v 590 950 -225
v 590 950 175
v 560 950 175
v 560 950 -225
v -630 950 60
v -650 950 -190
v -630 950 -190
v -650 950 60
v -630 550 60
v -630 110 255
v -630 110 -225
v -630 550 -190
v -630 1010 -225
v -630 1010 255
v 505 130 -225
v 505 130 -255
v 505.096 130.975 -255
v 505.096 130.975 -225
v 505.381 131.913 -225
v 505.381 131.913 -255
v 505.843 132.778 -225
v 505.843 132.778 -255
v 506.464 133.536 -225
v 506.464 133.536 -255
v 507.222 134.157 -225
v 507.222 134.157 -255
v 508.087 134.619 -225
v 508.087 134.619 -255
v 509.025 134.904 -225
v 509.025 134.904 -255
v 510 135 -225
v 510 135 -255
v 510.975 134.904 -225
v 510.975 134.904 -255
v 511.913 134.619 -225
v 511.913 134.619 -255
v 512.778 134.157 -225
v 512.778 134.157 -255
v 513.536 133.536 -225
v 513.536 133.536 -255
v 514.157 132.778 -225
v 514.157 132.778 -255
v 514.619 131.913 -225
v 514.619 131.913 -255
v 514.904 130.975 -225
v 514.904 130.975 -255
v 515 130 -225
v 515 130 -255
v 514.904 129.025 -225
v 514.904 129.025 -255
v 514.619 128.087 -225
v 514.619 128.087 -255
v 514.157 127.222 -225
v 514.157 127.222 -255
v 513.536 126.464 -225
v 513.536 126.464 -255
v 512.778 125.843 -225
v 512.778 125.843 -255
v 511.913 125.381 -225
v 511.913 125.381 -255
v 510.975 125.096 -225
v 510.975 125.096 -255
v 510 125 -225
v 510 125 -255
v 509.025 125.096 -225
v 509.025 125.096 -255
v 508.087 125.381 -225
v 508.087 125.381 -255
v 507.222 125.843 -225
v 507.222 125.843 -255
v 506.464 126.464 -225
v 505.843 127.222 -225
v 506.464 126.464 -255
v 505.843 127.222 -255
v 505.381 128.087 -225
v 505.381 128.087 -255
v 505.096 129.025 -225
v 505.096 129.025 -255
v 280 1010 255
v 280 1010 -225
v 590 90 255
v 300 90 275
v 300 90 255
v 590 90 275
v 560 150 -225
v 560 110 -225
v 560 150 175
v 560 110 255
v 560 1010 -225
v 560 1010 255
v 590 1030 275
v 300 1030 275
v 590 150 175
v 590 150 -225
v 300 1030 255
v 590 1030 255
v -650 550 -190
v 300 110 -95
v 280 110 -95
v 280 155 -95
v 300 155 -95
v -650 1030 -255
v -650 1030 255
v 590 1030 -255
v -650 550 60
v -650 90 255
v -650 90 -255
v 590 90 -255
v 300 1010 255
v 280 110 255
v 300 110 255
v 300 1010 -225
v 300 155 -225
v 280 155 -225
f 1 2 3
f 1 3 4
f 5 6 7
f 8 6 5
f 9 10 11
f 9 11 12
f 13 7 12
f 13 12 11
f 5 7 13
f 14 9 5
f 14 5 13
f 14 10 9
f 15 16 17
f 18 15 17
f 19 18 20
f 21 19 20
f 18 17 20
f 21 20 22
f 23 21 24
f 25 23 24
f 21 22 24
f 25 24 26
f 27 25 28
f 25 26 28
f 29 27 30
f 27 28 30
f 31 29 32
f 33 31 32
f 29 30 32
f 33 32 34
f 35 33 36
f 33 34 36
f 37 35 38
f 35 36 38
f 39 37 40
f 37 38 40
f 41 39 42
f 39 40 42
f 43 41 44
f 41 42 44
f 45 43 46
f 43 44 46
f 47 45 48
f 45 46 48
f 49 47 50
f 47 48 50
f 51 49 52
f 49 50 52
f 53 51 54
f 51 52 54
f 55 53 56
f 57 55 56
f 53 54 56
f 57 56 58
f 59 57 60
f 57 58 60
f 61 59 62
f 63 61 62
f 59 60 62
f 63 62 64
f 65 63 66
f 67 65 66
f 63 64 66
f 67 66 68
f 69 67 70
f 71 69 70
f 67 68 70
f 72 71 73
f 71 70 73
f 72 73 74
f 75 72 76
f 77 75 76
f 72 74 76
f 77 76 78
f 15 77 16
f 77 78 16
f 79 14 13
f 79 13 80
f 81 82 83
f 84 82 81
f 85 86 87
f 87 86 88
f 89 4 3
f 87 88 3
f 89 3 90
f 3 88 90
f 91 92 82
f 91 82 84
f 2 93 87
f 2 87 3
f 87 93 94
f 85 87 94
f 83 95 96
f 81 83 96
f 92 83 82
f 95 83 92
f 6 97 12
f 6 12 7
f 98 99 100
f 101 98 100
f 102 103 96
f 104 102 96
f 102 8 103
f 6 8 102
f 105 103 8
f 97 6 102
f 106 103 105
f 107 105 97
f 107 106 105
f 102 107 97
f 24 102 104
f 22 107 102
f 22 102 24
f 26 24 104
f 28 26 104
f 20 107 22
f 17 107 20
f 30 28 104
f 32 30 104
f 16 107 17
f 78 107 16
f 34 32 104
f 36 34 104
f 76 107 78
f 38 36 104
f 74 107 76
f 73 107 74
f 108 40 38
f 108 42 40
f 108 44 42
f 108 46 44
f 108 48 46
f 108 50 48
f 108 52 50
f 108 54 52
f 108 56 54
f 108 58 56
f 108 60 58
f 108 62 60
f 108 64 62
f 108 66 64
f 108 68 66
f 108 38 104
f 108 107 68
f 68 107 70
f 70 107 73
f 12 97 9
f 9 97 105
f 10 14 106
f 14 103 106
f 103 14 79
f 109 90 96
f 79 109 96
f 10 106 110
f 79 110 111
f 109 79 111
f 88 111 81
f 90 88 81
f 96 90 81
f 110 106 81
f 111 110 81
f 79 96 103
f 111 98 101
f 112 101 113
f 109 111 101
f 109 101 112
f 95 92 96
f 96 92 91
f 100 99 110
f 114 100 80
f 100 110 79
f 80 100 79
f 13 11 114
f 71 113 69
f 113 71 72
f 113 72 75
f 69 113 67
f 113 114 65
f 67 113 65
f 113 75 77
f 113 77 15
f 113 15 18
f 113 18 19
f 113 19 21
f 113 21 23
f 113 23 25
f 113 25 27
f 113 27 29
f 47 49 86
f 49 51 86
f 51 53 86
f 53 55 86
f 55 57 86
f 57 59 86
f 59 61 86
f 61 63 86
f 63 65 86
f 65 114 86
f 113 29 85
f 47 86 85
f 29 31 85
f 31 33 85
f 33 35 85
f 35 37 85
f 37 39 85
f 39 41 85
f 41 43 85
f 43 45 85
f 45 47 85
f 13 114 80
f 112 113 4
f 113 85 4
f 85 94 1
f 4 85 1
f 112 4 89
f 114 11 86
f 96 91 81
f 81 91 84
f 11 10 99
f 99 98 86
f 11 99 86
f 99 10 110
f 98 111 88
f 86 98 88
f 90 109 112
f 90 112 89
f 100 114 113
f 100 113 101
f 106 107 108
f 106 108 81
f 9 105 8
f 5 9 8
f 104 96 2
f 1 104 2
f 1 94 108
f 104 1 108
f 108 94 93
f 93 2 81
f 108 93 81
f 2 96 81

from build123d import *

# Parameters (mm, degrees)
CROQUIS1_W              = 1300
CROQUIS1_H              = 510
SALIENTE_EXTRUIR1_DEPTH = 1200
CROQUIS2_W              = 910
CROQUIS2_H              = 900
CORTAR_EXTRUIR1_DEPTH   = 480
CROQUIS3_W              = 250
CROQUIS3_H              = 400
CORTAR_EXTRUIR2_DEPTH   = 70
CROQUIS4_W              = 260
CROQUIS4_H              = 900
CORTAR_EXTRUIR3_DEPTH   = 480
CROQUIS5_W              = 400
CROQUIS5_H              = 800
CORTAR_EXTRUIR4_DEPTH   = 320
CROQUIS6_W              = 130
CROQUIS6_H              = 45
CORTAR_EXTRUIR5_DEPTH   = 230
CROQUIS7_W              = 350
CROQUIS7_H              = 1200
SALIENTE_EXTRUIR2_DEPTH = 20
CROQUIS9_W              = 510
CROQUIS9_H              = 90
CORTAR_EXTRUIR6_DEPTH   = 1440
CORTAR_EXTRUIR7_DEPTH   = 1440
CROQUIS12_W             = 290
CROQUIS12_H             = 90
CORTAR_EXTRUIR8_DEPTH   = 1440
CROQUIS14_W             = 1303.36123447
CROQUIS14_H             = 170
CORTAR_EXTRUIR9_DEPTH   = 1440
CROQUIS15_W             = 290
CROQUIS15_H             = 70
CORTAR_EXTRUIR10_DEPTH  = 1440
CROQUIS16_W             = 290
CROQUIS16_H             = 100
CORTAR_EXTRUIR11_DEPTH  = 1440
CROQUIS17_R             = 5
CORTAR_EXTRUIR12_DEPTH  = 30


with BuildPart() as part:
    # Croquis1 → Saliente-Extruir1 (new body)
    with BuildSketch(Plane(origin=(0, 0, 0), x_dir=(1, 0, 0), z_dir=(0, 1, 0))):
        Rectangle(CROQUIS1_W, CROQUIS1_H)
    extrude(amount=SALIENTE_EXTRUIR1_DEPTH)

    # Croquis2 → Cortar-Extruir1 (cut)
    with BuildSketch(Plane.XY.offset(255)):
        with Locations((-175, 560)):
            Rectangle(CROQUIS2_W, CROQUIS2_H)
    extrude(amount=-CORTAR_EXTRUIR1_DEPTH, mode=Mode.SUBTRACT)

    # Croquis3 → Cortar-Extruir2 (cut)
    with BuildSketch(Plane.ZY.offset(650)):
        with Locations((-65, 750)):
            Rectangle(CROQUIS3_W, CROQUIS3_H)
    extrude(amount=-CORTAR_EXTRUIR2_DEPTH, mode=Mode.SUBTRACT)

    # Croquis4 → Cortar-Extruir3 (cut)
    with BuildSketch(Plane.XY.offset(255)):
        with Locations((430, 560)):
            Rectangle(CROQUIS4_W, CROQUIS4_H)
    extrude(amount=-CORTAR_EXTRUIR3_DEPTH, mode=Mode.SUBTRACT)

    # Croquis5 → Cortar-Extruir4 (cut)
    with BuildSketch(Plane(origin=(650, 0, 0), x_dir=(0, 0, -1), z_dir=(1, 0, 0))):
        with Locations((25, 550)):
            Rectangle(CROQUIS5_W, CROQUIS5_H)
    extrude(amount=-CORTAR_EXTRUIR4_DEPTH, mode=Mode.SUBTRACT)

    # Croquis6 → Cortar-Extruir5 (cut)
    with BuildSketch(Plane.ZY.offset(-280)):
        with Locations((-160, 132.5)):
            Rectangle(CROQUIS6_W, CROQUIS6_H)
    extrude(amount=-CORTAR_EXTRUIR5_DEPTH, mode=Mode.SUBTRACT)

    # Croquis9 → Cortar-Extruir6 (cut)
    with BuildSketch(Plane.ZY.offset(650)):
        with Locations((0, 45)):
            Rectangle(CROQUIS9_W, CROQUIS9_H)
    extrude(amount=-CORTAR_EXTRUIR6_DEPTH, mode=Mode.SUBTRACT)


with BuildPart() as body_2:
    # Croquis7 → Saliente-Extruir2 (new body)
    with BuildSketch(Plane.XY.offset(255)):
        with Locations((475, 600)):
            Rectangle(CROQUIS7_W, CROQUIS7_H)
    extrude(amount=SALIENTE_EXTRUIR2_DEPTH)


with BuildPart() as cortar_extruir7_tool:
    # Croquis11 → Cortar-Extruir7 (new body)
    with BuildSketch(Plane.XY.offset(275)):
        Polygon((650, 1200), (590, 1200), (590, 90), (590, 0), (650, 0), align=None)
    extrude(amount=-CORTAR_EXTRUIR7_DEPTH)


with BuildPart() as part_1:
    add(part.part)

    # Cortar-Extruir7: cut by cortar_extruir7_tool
    add(cortar_extruir7_tool.part, mode=Mode.SUBTRACT)

    # Croquis14 → Cortar-Extruir9 (cut)
    with BuildSketch(Plane.XY.offset(255)):
        with Locations((1.680617235, 1115)):
            Rectangle(CROQUIS14_W, CROQUIS14_H)
    extrude(amount=-CORTAR_EXTRUIR9_DEPTH, mode=Mode.SUBTRACT)

    # Croquis17 → Cortar-Extruir12 (cut)
    with BuildSketch(Plane(origin=(0, 0, -255), x_dir=(-1, 0, 0), z_dir=(0, 0, -1))):
        with Locations((-510, 130)):
            Circle(CROQUIS17_R)
    extrude(amount=-CORTAR_EXTRUIR12_DEPTH, mode=Mode.SUBTRACT)


with BuildPart() as body_2_1:
    add(body_2.part)

    # Cortar-Extruir7: cut by cortar_extruir7_tool
    add(cortar_extruir7_tool.part, mode=Mode.SUBTRACT)

    # Croquis12 → Cortar-Extruir8 (cut)
    with BuildSketch(Plane.XY.offset(275)):
        with Locations((445, 45)):
            Rectangle(CROQUIS12_W, CROQUIS12_H)
    extrude(amount=-CORTAR_EXTRUIR8_DEPTH, mode=Mode.SUBTRACT)

    # Croquis15 → Cortar-Extruir10 (cut)
    with BuildSketch(Plane.XY.offset(275)):
        with Locations((445, 1165)):
            Rectangle(CROQUIS15_W, CROQUIS15_H)
    extrude(amount=-CORTAR_EXTRUIR10_DEPTH, mode=Mode.SUBTRACT)

    # Croquis16 → Cortar-Extruir11 (cut)
    with BuildSketch(Plane.XY.offset(275)):
        with Locations((445, 1080)):
            Rectangle(CROQUIS16_W, CROQUIS16_H)
    extrude(amount=-CORTAR_EXTRUIR11_DEPTH, mode=Mode.SUBTRACT)


solid = Compound([part_1.part, body_2_1.part])
